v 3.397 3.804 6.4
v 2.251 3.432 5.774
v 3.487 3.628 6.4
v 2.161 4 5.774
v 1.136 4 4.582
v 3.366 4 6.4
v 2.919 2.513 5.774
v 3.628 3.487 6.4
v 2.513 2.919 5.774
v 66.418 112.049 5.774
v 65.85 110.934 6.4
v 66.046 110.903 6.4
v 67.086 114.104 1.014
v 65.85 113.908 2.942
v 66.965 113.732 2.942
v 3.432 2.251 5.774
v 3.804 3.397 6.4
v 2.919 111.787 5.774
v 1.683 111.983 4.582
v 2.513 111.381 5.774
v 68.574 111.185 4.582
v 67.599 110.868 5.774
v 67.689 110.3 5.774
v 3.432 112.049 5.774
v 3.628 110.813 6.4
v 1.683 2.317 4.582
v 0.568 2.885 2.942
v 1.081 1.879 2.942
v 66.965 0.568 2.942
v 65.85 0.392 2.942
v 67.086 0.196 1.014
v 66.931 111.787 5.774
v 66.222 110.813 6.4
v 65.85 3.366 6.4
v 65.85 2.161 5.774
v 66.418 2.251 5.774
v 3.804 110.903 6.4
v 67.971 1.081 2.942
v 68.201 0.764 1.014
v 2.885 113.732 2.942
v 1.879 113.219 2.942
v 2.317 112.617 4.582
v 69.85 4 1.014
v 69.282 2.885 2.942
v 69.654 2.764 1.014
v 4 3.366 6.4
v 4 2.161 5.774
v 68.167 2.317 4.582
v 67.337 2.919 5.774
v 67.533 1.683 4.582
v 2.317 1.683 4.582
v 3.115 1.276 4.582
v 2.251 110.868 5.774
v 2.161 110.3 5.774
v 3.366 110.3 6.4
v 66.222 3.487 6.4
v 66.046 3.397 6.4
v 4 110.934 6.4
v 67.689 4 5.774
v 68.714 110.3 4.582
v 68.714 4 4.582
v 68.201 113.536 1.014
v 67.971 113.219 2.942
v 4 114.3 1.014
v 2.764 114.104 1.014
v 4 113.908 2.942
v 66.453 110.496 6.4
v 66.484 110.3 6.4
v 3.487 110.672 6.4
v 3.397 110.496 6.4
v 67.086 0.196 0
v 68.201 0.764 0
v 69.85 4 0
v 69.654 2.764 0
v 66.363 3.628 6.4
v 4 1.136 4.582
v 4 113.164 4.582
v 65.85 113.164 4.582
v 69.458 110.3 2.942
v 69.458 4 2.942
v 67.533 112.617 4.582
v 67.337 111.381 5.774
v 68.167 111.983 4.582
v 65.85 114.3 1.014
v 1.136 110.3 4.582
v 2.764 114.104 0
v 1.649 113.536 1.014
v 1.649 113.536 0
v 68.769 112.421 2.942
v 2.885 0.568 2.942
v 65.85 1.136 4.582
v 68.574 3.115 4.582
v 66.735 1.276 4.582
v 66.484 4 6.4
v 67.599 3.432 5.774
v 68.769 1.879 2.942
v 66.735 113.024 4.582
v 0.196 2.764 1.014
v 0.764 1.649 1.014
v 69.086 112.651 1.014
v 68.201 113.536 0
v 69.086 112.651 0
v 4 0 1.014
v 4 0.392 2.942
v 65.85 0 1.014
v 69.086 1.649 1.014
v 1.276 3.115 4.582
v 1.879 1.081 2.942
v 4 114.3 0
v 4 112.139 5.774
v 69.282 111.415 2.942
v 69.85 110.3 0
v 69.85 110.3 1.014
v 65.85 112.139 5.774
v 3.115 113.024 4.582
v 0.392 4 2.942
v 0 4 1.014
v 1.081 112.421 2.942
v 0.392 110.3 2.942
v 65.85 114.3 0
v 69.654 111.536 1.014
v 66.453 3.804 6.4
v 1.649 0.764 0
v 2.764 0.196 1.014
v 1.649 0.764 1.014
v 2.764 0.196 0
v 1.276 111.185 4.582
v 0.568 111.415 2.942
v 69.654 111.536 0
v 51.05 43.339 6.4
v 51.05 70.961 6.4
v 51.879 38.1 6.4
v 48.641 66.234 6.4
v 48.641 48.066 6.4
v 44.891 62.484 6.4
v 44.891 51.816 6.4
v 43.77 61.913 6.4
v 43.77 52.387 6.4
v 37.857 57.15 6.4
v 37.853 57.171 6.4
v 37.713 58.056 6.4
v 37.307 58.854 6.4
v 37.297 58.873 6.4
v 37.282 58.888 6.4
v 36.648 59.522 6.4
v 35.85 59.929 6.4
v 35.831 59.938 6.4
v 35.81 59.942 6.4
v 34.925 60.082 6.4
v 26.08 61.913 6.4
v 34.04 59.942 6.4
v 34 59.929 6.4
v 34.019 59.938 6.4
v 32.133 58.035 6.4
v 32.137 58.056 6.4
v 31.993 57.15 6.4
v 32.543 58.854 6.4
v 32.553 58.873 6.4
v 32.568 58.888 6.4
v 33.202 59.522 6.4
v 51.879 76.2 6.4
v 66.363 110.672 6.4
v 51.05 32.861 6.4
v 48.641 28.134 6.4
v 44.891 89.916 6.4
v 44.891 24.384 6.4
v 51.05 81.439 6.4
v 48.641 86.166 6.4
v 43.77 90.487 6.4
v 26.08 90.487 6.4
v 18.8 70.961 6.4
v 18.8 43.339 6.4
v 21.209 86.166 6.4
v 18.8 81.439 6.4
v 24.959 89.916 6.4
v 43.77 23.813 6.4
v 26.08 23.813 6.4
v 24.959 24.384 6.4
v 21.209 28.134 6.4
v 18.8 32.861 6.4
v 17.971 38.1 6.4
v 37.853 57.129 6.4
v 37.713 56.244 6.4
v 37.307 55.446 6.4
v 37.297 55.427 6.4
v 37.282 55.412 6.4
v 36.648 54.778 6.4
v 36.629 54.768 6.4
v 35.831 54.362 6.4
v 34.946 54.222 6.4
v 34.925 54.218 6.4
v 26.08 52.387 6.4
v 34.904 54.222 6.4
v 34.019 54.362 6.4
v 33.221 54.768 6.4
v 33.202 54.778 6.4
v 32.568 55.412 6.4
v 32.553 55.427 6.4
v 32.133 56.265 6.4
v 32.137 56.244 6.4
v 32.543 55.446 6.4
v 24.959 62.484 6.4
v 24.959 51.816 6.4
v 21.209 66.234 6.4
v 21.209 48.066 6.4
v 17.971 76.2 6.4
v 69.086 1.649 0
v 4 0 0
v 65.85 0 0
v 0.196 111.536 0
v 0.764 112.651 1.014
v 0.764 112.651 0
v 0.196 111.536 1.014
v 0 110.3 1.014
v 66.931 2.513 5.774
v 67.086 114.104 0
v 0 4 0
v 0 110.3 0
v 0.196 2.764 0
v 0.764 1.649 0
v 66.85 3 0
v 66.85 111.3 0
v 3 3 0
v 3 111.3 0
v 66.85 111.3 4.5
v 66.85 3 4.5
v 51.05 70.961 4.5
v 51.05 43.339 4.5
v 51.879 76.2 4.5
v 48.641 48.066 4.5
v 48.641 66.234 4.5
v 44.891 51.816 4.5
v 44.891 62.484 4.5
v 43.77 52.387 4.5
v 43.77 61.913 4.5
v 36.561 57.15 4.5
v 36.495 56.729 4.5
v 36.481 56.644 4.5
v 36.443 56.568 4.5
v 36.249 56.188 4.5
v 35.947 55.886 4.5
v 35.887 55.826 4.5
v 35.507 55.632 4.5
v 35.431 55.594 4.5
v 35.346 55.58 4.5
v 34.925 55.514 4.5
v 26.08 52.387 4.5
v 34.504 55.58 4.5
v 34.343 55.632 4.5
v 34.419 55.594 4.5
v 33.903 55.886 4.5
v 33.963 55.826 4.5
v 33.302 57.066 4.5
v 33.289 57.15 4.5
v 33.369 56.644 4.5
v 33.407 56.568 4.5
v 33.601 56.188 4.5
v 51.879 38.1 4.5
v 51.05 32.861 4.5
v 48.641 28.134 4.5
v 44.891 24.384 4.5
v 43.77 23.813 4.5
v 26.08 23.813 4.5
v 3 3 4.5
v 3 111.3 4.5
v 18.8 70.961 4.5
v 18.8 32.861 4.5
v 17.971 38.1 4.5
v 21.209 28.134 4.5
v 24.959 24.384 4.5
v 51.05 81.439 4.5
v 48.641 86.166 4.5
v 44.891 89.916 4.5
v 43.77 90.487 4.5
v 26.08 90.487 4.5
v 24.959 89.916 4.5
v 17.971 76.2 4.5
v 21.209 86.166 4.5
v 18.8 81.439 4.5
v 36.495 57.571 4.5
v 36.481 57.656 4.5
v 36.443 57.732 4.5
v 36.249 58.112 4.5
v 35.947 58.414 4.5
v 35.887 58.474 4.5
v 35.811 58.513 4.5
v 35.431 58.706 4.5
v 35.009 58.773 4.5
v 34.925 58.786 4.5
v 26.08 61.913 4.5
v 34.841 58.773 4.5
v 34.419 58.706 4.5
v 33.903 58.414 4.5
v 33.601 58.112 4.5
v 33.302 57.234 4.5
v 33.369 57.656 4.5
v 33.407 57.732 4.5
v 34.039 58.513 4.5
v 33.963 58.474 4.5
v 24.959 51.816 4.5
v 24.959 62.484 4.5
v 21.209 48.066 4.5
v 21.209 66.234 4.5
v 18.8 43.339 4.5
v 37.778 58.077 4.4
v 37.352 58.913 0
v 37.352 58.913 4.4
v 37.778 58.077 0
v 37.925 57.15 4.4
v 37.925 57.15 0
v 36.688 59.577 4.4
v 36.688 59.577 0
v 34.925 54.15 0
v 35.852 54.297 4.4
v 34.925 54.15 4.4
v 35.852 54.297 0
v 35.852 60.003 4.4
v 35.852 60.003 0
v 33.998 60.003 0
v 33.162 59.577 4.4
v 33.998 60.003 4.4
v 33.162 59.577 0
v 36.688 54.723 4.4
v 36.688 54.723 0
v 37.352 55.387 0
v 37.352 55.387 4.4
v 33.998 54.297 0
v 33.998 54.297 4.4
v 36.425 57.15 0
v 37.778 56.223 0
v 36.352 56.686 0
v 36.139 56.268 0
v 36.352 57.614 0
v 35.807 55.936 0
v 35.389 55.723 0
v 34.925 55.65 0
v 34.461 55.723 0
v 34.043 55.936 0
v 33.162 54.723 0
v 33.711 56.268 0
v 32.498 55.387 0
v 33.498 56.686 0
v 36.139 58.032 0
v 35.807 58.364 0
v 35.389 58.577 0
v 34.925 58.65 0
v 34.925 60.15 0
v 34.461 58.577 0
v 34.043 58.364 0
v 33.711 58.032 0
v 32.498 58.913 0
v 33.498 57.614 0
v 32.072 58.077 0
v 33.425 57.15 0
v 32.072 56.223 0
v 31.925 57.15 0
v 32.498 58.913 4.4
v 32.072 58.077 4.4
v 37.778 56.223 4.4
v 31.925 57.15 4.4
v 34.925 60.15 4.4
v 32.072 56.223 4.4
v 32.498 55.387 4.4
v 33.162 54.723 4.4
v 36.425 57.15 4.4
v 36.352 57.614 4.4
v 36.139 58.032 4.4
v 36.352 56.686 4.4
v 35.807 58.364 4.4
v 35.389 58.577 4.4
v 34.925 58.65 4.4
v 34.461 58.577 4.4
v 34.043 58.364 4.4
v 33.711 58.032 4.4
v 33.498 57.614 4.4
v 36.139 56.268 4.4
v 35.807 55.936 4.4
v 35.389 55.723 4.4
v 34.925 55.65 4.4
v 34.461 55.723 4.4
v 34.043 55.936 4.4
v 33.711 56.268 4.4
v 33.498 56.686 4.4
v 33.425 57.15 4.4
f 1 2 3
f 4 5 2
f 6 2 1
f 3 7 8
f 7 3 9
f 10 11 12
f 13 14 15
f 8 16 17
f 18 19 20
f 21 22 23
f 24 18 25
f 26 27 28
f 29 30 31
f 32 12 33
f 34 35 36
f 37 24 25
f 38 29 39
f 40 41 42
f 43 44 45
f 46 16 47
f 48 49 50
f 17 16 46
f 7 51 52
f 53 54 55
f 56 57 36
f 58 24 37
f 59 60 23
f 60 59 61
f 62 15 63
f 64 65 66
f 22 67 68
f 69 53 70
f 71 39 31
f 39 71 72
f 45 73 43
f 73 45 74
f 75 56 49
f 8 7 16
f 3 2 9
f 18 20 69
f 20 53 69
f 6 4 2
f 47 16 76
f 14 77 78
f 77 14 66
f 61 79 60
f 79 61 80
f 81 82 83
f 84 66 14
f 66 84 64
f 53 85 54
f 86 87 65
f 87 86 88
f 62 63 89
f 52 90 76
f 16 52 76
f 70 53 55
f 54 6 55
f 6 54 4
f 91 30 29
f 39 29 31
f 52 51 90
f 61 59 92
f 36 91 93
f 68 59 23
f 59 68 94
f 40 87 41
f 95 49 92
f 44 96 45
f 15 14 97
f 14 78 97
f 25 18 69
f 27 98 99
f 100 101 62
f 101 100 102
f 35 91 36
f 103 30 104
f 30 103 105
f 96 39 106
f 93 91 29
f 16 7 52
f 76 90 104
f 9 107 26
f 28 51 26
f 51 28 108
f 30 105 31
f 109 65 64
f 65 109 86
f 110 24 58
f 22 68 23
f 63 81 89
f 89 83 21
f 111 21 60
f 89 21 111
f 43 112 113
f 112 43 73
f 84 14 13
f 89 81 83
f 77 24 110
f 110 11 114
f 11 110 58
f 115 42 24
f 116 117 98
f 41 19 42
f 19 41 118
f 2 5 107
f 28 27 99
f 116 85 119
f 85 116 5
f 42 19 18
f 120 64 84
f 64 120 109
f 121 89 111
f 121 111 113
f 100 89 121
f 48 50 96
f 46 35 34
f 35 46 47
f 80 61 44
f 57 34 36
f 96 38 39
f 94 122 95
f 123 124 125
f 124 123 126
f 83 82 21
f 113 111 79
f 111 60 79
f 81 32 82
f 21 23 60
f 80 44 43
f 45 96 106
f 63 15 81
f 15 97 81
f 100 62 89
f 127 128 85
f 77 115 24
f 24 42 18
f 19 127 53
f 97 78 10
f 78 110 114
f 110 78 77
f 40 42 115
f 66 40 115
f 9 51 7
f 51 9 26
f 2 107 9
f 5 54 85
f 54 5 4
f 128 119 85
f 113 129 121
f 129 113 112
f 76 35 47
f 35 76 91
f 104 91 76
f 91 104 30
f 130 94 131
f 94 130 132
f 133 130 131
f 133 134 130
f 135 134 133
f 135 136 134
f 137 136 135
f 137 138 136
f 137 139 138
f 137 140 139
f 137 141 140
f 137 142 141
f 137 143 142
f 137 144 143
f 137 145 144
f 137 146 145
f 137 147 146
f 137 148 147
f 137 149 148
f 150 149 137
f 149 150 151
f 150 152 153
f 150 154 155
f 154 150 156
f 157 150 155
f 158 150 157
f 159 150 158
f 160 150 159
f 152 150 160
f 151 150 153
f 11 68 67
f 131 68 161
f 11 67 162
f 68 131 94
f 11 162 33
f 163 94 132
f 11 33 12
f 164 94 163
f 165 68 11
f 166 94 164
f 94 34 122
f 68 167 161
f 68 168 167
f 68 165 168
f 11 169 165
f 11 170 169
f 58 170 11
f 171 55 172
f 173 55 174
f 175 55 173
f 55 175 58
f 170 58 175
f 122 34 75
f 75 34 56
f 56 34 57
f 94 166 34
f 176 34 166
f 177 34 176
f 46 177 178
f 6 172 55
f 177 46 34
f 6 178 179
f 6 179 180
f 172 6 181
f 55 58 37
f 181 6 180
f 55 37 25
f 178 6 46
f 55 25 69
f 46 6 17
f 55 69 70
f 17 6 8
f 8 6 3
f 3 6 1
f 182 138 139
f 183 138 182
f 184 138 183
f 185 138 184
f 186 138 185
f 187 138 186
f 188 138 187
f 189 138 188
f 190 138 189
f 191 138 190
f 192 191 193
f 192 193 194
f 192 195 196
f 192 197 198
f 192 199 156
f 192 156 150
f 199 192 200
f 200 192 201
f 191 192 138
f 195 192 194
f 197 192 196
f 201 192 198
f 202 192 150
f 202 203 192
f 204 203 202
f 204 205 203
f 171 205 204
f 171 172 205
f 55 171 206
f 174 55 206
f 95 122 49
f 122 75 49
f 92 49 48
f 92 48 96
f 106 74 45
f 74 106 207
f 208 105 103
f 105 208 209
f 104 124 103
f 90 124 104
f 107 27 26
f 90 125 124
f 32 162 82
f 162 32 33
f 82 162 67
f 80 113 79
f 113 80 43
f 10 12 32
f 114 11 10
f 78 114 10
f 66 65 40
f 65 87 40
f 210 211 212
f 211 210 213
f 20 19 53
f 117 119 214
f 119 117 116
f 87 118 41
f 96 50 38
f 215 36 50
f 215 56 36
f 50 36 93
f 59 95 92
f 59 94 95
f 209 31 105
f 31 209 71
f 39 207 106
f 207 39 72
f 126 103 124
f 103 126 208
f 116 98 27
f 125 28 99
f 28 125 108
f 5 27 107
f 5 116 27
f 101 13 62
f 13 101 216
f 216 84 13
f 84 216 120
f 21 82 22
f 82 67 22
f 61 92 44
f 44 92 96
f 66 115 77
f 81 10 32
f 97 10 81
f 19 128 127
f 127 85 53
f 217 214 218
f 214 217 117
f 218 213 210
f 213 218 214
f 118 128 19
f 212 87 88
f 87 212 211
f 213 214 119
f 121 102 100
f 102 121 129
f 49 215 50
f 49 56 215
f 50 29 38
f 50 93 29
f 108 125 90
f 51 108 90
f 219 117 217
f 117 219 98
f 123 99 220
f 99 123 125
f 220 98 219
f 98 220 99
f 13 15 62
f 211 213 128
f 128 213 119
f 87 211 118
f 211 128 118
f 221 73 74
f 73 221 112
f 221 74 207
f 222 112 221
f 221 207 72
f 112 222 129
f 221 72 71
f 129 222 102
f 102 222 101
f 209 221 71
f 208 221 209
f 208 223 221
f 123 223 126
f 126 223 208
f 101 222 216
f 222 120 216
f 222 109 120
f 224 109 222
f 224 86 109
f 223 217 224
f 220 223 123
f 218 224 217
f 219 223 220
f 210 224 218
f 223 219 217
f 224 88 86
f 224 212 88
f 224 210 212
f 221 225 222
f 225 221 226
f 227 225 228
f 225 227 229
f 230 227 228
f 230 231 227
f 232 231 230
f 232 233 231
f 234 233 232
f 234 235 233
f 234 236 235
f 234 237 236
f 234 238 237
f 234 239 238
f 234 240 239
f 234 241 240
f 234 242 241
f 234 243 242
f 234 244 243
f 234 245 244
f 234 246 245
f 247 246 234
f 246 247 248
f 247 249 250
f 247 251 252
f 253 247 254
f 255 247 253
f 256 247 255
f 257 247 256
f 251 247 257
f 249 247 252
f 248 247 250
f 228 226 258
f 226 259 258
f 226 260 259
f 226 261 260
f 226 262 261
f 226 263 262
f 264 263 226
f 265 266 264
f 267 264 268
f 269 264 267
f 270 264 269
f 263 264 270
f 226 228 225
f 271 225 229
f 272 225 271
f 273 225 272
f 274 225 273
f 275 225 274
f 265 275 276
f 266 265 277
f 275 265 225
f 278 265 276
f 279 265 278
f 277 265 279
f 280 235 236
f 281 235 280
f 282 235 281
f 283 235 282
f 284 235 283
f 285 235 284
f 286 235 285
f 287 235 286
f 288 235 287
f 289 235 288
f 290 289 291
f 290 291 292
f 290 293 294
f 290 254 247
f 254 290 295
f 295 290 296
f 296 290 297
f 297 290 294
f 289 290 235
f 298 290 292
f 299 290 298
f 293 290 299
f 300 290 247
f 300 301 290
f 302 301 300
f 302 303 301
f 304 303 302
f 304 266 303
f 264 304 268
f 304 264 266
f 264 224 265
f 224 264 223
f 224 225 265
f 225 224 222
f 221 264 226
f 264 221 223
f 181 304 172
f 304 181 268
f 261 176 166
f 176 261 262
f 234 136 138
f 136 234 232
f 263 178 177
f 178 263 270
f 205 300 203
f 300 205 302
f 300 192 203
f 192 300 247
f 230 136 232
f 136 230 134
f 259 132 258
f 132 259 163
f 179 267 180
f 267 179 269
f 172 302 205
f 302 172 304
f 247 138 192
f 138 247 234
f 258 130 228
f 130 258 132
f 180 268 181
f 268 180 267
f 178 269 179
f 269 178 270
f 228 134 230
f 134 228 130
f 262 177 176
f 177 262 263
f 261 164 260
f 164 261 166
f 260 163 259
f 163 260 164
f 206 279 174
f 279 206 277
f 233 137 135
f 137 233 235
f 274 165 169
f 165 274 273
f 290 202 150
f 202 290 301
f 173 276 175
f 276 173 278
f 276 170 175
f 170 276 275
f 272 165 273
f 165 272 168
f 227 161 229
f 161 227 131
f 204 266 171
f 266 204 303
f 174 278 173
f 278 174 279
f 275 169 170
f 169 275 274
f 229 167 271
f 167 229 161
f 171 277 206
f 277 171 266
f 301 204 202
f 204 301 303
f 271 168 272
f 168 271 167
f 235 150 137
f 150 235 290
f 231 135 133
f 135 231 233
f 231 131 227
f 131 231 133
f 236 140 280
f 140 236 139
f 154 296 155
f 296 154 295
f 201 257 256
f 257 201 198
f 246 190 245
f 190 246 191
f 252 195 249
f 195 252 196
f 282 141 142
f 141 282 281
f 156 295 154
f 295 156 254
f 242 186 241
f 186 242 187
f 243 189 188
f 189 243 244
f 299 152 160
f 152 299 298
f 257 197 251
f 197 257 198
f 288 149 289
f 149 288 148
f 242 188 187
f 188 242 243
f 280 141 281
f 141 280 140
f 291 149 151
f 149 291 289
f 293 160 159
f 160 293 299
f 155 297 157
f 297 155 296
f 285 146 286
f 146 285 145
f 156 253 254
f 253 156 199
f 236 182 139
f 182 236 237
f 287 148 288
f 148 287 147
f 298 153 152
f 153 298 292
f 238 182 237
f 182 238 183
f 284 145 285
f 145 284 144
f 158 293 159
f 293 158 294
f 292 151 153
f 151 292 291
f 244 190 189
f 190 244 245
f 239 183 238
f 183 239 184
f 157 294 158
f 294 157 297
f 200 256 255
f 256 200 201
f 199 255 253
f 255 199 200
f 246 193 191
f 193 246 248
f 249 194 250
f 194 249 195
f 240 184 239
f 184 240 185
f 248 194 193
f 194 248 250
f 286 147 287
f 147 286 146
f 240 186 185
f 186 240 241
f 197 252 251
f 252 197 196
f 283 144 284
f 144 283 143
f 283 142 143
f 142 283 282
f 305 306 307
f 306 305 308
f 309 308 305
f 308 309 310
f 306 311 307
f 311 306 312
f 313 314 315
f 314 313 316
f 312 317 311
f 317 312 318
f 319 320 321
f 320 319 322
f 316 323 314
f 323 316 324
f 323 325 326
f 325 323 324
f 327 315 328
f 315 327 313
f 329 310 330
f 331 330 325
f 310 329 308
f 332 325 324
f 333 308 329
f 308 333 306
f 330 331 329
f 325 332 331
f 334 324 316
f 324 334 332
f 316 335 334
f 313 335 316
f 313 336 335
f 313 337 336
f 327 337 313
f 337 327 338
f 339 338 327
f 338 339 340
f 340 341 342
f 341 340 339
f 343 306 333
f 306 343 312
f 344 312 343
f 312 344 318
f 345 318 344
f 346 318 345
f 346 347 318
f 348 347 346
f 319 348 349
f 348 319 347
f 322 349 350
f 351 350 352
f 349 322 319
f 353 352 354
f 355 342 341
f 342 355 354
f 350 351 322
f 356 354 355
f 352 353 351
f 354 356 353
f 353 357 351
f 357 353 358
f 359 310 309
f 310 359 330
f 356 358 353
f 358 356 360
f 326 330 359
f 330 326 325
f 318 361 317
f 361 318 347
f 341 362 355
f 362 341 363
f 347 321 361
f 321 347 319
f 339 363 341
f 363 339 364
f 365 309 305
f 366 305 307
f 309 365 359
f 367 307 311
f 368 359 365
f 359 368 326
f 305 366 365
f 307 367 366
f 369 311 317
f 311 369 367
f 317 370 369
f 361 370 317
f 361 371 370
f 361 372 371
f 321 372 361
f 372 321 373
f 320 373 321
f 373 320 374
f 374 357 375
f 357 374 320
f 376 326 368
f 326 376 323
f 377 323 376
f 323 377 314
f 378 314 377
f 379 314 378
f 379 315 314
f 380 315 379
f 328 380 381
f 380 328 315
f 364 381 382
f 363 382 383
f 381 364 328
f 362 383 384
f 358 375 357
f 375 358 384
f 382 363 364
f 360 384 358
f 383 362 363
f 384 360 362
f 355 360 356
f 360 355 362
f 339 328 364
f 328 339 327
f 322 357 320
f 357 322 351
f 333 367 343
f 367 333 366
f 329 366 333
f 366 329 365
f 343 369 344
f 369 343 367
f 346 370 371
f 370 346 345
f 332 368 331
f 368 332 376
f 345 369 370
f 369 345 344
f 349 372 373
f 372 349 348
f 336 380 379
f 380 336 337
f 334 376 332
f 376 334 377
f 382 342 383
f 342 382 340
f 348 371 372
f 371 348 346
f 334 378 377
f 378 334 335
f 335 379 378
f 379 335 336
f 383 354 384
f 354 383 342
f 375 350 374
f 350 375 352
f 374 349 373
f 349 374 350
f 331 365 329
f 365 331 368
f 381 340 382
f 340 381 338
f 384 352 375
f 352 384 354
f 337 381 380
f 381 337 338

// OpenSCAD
// file: 2dplug.scad
inch=25.4;
sqwidth=(1+3/8)*inch;
sqheight=(1+1/8)*inch;

module 2dplug() {
    intersection() {
        circle(r=.6675*inch);
        translate([-sqwidth/2, -sqheight/2]) square([sqwidth, sqheight]);
    }
}

//linear_extrude(2) 2dplug();
// main file
include <2dplug.scad>;

inch = 25.4;
width = 2.75 * inch;
height = 4.5 * inch;
depth = 6.4;

cyl = 8;
cyld = 1;

$fn=20;
union() {
    difference() {
        intersection() {
            hull() {
                translate([cyl/2,cyl/2,0]) longsphere(cyl,depth*2);
                translate([width-cyl/2,cyl/2,0]) longsphere(cyl,depth*2);
                translate([cyl/2,height-cyl/2,0]) longsphere(cyl,depth*2);
                translate([width-cyl/2,height-cyl/2,0]) longsphere(cyl,depth*2);
            }
            cube([width, height, depth]);
        }
        //translate([width/2, 8.75, 0]) screwhole(3);
        //translate([width/2, height-8.75, 0]) screwhole(3);
        translate([3,3,-.1]) cube([width-6, height-6, depth-2+.2]);
        totalHeight = 1.5*inch;
        translate([(width)/2, (height-totalHeight)/2, 0]) linear_extrude(depth+.1) 2dplug();
        translate([(width)/2, (height+totalHeight)/2, 0]) linear_extrude(depth+.1) 2dplug();
        translate([width/2, height/2, 0]) screwhole(3);
        //translate([(width-33.2+cyl/2)/2,(height-66.8+cyl/2)/2,0]) largeSwitch();
    }
    translate([width/2,height/2,0]) screwguide(3);
}

module longsphere(diam, height) {
    resize([diam, diam, height]) sphere(diam/2);
}

module screwhole(diam) {
    translate([0,0,depth-2-0.1]) cylinder(d1=diam, d2=diam*2, h=2+.2);
}

module screwguide(diam) {
        difference() {
        cylinder(d=diam*2, h=depth-2);
        translate([0,0,-.1]) cylinder(d=diam, h=depth-2+.2);
    }
}

module largeSwitch() {
    minkowski() {
        cube([33.2-cyl/2, 66.8-cyl/2,depth]);
        cylinder(d=cyl/2, h=cyld);
    }
}
